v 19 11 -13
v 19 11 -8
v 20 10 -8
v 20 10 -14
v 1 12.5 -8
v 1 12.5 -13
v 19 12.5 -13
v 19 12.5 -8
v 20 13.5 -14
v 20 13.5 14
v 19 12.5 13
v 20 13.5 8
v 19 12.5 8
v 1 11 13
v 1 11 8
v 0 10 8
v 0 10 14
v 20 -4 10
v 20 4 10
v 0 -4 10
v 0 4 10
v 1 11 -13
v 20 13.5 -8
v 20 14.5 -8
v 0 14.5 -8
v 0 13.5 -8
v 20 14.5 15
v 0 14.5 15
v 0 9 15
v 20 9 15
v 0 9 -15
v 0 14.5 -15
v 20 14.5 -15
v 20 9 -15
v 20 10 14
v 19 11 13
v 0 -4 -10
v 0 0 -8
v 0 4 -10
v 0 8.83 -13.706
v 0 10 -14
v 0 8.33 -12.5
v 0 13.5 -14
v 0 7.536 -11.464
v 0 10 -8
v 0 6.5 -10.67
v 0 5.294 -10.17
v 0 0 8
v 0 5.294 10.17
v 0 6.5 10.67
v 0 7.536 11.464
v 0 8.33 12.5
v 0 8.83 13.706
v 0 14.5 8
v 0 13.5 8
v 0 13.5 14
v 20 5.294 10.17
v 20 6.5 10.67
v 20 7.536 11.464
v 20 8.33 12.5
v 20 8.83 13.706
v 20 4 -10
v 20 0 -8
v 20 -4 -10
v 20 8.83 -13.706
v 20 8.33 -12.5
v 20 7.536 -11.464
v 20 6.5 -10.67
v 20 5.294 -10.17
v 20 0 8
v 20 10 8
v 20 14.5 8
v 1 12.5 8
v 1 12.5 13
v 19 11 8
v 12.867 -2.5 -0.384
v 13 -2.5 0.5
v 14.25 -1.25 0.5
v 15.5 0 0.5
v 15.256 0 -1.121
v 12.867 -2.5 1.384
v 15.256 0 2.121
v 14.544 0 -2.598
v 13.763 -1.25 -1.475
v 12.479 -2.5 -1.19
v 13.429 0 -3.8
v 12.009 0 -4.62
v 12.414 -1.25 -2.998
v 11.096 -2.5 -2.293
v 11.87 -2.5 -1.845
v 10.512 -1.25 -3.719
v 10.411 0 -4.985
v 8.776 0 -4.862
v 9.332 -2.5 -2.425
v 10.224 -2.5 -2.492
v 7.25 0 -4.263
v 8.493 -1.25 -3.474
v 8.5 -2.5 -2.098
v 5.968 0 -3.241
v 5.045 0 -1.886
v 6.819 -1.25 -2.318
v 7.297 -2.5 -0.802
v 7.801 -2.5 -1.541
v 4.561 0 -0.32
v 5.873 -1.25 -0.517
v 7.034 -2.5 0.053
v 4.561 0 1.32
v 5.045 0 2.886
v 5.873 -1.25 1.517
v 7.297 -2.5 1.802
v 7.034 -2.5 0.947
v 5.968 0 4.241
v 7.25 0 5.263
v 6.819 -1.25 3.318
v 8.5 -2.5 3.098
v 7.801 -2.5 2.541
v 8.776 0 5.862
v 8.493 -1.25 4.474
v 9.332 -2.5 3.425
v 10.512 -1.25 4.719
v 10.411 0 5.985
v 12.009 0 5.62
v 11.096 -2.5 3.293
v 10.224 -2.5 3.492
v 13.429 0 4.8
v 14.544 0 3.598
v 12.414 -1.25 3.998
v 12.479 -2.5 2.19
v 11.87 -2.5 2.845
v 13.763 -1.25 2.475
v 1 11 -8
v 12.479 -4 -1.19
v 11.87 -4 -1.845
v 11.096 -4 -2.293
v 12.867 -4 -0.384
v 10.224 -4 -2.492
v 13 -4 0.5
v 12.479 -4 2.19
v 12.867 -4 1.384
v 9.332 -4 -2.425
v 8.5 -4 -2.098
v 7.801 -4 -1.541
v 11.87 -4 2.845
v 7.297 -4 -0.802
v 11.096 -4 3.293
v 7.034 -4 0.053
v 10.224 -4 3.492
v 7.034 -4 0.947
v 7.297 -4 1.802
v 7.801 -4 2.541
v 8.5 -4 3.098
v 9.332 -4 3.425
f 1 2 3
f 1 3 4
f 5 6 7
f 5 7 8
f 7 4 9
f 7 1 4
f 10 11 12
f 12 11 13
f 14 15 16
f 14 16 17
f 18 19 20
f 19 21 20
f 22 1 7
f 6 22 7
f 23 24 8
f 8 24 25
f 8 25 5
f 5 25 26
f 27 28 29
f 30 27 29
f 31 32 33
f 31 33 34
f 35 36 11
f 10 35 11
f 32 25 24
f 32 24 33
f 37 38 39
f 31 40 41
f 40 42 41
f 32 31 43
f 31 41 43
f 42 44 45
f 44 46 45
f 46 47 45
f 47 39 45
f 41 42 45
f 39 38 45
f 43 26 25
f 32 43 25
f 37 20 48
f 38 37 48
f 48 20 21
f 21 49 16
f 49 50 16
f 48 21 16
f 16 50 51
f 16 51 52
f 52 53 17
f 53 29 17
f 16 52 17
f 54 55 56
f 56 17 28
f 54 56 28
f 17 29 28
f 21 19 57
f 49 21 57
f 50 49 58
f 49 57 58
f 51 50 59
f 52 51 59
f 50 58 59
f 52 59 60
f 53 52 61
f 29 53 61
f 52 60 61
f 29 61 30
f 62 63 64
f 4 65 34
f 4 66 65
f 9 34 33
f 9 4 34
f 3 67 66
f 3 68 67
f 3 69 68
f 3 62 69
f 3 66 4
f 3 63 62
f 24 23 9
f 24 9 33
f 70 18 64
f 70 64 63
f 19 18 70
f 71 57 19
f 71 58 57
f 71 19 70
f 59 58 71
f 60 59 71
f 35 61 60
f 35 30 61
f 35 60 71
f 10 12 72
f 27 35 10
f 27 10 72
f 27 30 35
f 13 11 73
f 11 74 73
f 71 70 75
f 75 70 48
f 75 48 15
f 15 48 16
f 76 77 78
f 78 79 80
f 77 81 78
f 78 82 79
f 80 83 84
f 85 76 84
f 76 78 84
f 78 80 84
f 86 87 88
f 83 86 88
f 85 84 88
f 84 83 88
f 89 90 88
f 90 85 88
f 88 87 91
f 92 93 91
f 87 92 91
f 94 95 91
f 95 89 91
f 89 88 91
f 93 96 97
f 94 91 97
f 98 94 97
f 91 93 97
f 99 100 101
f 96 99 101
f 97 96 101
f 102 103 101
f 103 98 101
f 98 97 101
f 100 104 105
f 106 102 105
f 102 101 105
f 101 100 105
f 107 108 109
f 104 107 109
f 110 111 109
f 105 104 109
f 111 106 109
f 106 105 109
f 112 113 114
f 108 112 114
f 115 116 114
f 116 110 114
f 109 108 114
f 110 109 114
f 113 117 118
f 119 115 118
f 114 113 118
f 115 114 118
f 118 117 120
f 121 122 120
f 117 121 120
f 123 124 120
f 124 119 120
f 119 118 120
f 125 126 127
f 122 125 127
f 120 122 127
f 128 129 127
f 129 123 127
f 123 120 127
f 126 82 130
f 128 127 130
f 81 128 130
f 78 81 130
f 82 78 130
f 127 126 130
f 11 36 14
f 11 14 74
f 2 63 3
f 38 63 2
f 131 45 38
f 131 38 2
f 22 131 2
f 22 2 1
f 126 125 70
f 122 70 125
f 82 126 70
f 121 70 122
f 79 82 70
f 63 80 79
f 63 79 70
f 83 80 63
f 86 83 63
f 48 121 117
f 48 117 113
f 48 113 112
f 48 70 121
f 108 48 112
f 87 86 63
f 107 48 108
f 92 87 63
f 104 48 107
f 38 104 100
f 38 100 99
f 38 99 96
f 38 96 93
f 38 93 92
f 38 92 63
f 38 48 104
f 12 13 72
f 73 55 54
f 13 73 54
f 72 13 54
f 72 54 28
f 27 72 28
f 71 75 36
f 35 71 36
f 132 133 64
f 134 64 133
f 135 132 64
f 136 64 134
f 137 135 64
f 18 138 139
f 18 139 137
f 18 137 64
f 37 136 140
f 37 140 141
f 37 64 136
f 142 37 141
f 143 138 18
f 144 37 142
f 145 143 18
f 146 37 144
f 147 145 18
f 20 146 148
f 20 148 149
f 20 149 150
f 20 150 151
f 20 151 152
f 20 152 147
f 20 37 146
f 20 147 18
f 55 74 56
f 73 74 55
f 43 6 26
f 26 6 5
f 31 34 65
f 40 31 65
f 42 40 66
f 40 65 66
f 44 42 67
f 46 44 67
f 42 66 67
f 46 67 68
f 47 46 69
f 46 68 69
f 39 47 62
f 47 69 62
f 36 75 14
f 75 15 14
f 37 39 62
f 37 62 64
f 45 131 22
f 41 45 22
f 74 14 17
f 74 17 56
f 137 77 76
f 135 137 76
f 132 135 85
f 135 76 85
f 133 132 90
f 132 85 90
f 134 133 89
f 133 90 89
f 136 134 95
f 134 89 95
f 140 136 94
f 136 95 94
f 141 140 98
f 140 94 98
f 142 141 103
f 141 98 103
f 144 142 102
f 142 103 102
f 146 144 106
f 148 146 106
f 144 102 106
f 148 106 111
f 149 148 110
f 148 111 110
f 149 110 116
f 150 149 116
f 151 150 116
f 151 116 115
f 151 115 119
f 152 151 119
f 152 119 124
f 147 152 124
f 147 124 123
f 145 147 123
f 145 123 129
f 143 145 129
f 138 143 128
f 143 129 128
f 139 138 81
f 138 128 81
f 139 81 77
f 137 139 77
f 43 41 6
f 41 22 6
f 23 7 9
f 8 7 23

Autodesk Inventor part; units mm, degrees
ref_plane "YZ Plane" through (0, 0, 0) normal (1, 0, 0) x (0, 1, 0)
ref_plane "XZ Plane" through (0, 0, 0) normal (0, 1, 0) x (-1, 0, 0)
ref_plane "XY Plane" through (0, 0, 0) normal (0, 0, 1) x (1, 0, 0)
sketch "Sketch1" plane through (0, 0, 0) normal (1, 0, 0) x (0, 1, 0)
  line L0 (0, 8) -> (0, -8)
  line L1 (0, -8) -> (11, -8)
  line L2 (0, 8) -> (11, 8)
  line L3 (11, 8) -> (11, 13)
  line L4 (11, 13) -> (12.5, 13)
  line L5 (12.5, 13) -> (12.5, 8)
  line L6 (12.5, 8) -> (14.5, 8)
  line L7 (14.5, 8) -> (14.5, 15)
  line L8 (14.5, 15) -> (9, 15)
  line L9 (9, 15) -> (9, 10)
  line L10 (9, 10) -> (-3, 10)
  line L11 (-3, 10) -> (-4, 10)
  line L12 (-4, 10) -> (-4, 2.5)
  line L13 (0, 0) -> (3.5, 0)
  line L14 (0, -8) -> (11, -8)
  line L15 (11, -8) -> (11, -13)
  line L16 (11, -13) -> (12.5, -13)
  line L17 (12.5, -13) -> (12.5, -8)
  line L18 (14.5, -8) -> (14.5, -15)
  line L19 (14.5, -15) -> (9, -15)
  line L20 (9, -15) -> (9, -10)
  line L21 (9, -10) -> (-3, -10)
  line L22 (-3, -10) -> (-4, -10)
  line L23 (-4, -10) -> (-4, 2.5)
  line L24 (14.5, -8) -> (12.5, -8)
  point P0 (11.75, -15)
  point P1 (11.75, -13)
  dimension "d0" = 16
  dimension "d1" = 0
  dimension "d2" = 11
  dimension "d3" = 11
  dimension "d4" = 5
  dimension "d5" = 1.5
  dimension "d6" = 2
  dimension "d7" = 7
  dimension "d8" = 5.5
  dimension "d9" = 5
  dimension "d10" = 1
  dimension "d13" = 2
  dimension "d14" = 4
extrude "Extrusion1" add sketch "Sketch1" along normal blind 20
fillet "Fillet1" radius 5 2 edges at (10, 9, -10) (10, 9, 10)
chamfer "Chamfer1" distance 1 angle 45 12 edges at (20, 11, -10.5) (20, 11.75, -13) (20, 12.5, -10.5) (20, 11, 10.5) (20, 11.75, 13) (20, 12.5, 10.5) (0, 11, -10.5) (0, 11.75, -13) (0, 12.5, -10.5) (0, 11, 10.5) (0, 11.75, 13) (0, 12.5, 10.5)
sketch "Sketch2" plane through (0, 0, 8) normal (0, 1, 0) x (1, 0, 0)
  circle A0 centre (10, 7.5) radius 3
  line L0 (20, 16) -> (20, 0) projected
  line L1 (0, -7) -> (20, -7) projected
  line L2 (0, 0) -> (20, 0) projected
  point P0 (0, 8)
  dimension "d19" = 6
  dimension "d20" = 10
  dimension "d27" = 7.5
extrude "Extrusion2" cut sketch "Sketch2" against normal blind 20
chamfer "Chamfer2" distance 2.5 angle 45 1 edges at (7, 0, 0.5)
properties part number "Drziak_2"
